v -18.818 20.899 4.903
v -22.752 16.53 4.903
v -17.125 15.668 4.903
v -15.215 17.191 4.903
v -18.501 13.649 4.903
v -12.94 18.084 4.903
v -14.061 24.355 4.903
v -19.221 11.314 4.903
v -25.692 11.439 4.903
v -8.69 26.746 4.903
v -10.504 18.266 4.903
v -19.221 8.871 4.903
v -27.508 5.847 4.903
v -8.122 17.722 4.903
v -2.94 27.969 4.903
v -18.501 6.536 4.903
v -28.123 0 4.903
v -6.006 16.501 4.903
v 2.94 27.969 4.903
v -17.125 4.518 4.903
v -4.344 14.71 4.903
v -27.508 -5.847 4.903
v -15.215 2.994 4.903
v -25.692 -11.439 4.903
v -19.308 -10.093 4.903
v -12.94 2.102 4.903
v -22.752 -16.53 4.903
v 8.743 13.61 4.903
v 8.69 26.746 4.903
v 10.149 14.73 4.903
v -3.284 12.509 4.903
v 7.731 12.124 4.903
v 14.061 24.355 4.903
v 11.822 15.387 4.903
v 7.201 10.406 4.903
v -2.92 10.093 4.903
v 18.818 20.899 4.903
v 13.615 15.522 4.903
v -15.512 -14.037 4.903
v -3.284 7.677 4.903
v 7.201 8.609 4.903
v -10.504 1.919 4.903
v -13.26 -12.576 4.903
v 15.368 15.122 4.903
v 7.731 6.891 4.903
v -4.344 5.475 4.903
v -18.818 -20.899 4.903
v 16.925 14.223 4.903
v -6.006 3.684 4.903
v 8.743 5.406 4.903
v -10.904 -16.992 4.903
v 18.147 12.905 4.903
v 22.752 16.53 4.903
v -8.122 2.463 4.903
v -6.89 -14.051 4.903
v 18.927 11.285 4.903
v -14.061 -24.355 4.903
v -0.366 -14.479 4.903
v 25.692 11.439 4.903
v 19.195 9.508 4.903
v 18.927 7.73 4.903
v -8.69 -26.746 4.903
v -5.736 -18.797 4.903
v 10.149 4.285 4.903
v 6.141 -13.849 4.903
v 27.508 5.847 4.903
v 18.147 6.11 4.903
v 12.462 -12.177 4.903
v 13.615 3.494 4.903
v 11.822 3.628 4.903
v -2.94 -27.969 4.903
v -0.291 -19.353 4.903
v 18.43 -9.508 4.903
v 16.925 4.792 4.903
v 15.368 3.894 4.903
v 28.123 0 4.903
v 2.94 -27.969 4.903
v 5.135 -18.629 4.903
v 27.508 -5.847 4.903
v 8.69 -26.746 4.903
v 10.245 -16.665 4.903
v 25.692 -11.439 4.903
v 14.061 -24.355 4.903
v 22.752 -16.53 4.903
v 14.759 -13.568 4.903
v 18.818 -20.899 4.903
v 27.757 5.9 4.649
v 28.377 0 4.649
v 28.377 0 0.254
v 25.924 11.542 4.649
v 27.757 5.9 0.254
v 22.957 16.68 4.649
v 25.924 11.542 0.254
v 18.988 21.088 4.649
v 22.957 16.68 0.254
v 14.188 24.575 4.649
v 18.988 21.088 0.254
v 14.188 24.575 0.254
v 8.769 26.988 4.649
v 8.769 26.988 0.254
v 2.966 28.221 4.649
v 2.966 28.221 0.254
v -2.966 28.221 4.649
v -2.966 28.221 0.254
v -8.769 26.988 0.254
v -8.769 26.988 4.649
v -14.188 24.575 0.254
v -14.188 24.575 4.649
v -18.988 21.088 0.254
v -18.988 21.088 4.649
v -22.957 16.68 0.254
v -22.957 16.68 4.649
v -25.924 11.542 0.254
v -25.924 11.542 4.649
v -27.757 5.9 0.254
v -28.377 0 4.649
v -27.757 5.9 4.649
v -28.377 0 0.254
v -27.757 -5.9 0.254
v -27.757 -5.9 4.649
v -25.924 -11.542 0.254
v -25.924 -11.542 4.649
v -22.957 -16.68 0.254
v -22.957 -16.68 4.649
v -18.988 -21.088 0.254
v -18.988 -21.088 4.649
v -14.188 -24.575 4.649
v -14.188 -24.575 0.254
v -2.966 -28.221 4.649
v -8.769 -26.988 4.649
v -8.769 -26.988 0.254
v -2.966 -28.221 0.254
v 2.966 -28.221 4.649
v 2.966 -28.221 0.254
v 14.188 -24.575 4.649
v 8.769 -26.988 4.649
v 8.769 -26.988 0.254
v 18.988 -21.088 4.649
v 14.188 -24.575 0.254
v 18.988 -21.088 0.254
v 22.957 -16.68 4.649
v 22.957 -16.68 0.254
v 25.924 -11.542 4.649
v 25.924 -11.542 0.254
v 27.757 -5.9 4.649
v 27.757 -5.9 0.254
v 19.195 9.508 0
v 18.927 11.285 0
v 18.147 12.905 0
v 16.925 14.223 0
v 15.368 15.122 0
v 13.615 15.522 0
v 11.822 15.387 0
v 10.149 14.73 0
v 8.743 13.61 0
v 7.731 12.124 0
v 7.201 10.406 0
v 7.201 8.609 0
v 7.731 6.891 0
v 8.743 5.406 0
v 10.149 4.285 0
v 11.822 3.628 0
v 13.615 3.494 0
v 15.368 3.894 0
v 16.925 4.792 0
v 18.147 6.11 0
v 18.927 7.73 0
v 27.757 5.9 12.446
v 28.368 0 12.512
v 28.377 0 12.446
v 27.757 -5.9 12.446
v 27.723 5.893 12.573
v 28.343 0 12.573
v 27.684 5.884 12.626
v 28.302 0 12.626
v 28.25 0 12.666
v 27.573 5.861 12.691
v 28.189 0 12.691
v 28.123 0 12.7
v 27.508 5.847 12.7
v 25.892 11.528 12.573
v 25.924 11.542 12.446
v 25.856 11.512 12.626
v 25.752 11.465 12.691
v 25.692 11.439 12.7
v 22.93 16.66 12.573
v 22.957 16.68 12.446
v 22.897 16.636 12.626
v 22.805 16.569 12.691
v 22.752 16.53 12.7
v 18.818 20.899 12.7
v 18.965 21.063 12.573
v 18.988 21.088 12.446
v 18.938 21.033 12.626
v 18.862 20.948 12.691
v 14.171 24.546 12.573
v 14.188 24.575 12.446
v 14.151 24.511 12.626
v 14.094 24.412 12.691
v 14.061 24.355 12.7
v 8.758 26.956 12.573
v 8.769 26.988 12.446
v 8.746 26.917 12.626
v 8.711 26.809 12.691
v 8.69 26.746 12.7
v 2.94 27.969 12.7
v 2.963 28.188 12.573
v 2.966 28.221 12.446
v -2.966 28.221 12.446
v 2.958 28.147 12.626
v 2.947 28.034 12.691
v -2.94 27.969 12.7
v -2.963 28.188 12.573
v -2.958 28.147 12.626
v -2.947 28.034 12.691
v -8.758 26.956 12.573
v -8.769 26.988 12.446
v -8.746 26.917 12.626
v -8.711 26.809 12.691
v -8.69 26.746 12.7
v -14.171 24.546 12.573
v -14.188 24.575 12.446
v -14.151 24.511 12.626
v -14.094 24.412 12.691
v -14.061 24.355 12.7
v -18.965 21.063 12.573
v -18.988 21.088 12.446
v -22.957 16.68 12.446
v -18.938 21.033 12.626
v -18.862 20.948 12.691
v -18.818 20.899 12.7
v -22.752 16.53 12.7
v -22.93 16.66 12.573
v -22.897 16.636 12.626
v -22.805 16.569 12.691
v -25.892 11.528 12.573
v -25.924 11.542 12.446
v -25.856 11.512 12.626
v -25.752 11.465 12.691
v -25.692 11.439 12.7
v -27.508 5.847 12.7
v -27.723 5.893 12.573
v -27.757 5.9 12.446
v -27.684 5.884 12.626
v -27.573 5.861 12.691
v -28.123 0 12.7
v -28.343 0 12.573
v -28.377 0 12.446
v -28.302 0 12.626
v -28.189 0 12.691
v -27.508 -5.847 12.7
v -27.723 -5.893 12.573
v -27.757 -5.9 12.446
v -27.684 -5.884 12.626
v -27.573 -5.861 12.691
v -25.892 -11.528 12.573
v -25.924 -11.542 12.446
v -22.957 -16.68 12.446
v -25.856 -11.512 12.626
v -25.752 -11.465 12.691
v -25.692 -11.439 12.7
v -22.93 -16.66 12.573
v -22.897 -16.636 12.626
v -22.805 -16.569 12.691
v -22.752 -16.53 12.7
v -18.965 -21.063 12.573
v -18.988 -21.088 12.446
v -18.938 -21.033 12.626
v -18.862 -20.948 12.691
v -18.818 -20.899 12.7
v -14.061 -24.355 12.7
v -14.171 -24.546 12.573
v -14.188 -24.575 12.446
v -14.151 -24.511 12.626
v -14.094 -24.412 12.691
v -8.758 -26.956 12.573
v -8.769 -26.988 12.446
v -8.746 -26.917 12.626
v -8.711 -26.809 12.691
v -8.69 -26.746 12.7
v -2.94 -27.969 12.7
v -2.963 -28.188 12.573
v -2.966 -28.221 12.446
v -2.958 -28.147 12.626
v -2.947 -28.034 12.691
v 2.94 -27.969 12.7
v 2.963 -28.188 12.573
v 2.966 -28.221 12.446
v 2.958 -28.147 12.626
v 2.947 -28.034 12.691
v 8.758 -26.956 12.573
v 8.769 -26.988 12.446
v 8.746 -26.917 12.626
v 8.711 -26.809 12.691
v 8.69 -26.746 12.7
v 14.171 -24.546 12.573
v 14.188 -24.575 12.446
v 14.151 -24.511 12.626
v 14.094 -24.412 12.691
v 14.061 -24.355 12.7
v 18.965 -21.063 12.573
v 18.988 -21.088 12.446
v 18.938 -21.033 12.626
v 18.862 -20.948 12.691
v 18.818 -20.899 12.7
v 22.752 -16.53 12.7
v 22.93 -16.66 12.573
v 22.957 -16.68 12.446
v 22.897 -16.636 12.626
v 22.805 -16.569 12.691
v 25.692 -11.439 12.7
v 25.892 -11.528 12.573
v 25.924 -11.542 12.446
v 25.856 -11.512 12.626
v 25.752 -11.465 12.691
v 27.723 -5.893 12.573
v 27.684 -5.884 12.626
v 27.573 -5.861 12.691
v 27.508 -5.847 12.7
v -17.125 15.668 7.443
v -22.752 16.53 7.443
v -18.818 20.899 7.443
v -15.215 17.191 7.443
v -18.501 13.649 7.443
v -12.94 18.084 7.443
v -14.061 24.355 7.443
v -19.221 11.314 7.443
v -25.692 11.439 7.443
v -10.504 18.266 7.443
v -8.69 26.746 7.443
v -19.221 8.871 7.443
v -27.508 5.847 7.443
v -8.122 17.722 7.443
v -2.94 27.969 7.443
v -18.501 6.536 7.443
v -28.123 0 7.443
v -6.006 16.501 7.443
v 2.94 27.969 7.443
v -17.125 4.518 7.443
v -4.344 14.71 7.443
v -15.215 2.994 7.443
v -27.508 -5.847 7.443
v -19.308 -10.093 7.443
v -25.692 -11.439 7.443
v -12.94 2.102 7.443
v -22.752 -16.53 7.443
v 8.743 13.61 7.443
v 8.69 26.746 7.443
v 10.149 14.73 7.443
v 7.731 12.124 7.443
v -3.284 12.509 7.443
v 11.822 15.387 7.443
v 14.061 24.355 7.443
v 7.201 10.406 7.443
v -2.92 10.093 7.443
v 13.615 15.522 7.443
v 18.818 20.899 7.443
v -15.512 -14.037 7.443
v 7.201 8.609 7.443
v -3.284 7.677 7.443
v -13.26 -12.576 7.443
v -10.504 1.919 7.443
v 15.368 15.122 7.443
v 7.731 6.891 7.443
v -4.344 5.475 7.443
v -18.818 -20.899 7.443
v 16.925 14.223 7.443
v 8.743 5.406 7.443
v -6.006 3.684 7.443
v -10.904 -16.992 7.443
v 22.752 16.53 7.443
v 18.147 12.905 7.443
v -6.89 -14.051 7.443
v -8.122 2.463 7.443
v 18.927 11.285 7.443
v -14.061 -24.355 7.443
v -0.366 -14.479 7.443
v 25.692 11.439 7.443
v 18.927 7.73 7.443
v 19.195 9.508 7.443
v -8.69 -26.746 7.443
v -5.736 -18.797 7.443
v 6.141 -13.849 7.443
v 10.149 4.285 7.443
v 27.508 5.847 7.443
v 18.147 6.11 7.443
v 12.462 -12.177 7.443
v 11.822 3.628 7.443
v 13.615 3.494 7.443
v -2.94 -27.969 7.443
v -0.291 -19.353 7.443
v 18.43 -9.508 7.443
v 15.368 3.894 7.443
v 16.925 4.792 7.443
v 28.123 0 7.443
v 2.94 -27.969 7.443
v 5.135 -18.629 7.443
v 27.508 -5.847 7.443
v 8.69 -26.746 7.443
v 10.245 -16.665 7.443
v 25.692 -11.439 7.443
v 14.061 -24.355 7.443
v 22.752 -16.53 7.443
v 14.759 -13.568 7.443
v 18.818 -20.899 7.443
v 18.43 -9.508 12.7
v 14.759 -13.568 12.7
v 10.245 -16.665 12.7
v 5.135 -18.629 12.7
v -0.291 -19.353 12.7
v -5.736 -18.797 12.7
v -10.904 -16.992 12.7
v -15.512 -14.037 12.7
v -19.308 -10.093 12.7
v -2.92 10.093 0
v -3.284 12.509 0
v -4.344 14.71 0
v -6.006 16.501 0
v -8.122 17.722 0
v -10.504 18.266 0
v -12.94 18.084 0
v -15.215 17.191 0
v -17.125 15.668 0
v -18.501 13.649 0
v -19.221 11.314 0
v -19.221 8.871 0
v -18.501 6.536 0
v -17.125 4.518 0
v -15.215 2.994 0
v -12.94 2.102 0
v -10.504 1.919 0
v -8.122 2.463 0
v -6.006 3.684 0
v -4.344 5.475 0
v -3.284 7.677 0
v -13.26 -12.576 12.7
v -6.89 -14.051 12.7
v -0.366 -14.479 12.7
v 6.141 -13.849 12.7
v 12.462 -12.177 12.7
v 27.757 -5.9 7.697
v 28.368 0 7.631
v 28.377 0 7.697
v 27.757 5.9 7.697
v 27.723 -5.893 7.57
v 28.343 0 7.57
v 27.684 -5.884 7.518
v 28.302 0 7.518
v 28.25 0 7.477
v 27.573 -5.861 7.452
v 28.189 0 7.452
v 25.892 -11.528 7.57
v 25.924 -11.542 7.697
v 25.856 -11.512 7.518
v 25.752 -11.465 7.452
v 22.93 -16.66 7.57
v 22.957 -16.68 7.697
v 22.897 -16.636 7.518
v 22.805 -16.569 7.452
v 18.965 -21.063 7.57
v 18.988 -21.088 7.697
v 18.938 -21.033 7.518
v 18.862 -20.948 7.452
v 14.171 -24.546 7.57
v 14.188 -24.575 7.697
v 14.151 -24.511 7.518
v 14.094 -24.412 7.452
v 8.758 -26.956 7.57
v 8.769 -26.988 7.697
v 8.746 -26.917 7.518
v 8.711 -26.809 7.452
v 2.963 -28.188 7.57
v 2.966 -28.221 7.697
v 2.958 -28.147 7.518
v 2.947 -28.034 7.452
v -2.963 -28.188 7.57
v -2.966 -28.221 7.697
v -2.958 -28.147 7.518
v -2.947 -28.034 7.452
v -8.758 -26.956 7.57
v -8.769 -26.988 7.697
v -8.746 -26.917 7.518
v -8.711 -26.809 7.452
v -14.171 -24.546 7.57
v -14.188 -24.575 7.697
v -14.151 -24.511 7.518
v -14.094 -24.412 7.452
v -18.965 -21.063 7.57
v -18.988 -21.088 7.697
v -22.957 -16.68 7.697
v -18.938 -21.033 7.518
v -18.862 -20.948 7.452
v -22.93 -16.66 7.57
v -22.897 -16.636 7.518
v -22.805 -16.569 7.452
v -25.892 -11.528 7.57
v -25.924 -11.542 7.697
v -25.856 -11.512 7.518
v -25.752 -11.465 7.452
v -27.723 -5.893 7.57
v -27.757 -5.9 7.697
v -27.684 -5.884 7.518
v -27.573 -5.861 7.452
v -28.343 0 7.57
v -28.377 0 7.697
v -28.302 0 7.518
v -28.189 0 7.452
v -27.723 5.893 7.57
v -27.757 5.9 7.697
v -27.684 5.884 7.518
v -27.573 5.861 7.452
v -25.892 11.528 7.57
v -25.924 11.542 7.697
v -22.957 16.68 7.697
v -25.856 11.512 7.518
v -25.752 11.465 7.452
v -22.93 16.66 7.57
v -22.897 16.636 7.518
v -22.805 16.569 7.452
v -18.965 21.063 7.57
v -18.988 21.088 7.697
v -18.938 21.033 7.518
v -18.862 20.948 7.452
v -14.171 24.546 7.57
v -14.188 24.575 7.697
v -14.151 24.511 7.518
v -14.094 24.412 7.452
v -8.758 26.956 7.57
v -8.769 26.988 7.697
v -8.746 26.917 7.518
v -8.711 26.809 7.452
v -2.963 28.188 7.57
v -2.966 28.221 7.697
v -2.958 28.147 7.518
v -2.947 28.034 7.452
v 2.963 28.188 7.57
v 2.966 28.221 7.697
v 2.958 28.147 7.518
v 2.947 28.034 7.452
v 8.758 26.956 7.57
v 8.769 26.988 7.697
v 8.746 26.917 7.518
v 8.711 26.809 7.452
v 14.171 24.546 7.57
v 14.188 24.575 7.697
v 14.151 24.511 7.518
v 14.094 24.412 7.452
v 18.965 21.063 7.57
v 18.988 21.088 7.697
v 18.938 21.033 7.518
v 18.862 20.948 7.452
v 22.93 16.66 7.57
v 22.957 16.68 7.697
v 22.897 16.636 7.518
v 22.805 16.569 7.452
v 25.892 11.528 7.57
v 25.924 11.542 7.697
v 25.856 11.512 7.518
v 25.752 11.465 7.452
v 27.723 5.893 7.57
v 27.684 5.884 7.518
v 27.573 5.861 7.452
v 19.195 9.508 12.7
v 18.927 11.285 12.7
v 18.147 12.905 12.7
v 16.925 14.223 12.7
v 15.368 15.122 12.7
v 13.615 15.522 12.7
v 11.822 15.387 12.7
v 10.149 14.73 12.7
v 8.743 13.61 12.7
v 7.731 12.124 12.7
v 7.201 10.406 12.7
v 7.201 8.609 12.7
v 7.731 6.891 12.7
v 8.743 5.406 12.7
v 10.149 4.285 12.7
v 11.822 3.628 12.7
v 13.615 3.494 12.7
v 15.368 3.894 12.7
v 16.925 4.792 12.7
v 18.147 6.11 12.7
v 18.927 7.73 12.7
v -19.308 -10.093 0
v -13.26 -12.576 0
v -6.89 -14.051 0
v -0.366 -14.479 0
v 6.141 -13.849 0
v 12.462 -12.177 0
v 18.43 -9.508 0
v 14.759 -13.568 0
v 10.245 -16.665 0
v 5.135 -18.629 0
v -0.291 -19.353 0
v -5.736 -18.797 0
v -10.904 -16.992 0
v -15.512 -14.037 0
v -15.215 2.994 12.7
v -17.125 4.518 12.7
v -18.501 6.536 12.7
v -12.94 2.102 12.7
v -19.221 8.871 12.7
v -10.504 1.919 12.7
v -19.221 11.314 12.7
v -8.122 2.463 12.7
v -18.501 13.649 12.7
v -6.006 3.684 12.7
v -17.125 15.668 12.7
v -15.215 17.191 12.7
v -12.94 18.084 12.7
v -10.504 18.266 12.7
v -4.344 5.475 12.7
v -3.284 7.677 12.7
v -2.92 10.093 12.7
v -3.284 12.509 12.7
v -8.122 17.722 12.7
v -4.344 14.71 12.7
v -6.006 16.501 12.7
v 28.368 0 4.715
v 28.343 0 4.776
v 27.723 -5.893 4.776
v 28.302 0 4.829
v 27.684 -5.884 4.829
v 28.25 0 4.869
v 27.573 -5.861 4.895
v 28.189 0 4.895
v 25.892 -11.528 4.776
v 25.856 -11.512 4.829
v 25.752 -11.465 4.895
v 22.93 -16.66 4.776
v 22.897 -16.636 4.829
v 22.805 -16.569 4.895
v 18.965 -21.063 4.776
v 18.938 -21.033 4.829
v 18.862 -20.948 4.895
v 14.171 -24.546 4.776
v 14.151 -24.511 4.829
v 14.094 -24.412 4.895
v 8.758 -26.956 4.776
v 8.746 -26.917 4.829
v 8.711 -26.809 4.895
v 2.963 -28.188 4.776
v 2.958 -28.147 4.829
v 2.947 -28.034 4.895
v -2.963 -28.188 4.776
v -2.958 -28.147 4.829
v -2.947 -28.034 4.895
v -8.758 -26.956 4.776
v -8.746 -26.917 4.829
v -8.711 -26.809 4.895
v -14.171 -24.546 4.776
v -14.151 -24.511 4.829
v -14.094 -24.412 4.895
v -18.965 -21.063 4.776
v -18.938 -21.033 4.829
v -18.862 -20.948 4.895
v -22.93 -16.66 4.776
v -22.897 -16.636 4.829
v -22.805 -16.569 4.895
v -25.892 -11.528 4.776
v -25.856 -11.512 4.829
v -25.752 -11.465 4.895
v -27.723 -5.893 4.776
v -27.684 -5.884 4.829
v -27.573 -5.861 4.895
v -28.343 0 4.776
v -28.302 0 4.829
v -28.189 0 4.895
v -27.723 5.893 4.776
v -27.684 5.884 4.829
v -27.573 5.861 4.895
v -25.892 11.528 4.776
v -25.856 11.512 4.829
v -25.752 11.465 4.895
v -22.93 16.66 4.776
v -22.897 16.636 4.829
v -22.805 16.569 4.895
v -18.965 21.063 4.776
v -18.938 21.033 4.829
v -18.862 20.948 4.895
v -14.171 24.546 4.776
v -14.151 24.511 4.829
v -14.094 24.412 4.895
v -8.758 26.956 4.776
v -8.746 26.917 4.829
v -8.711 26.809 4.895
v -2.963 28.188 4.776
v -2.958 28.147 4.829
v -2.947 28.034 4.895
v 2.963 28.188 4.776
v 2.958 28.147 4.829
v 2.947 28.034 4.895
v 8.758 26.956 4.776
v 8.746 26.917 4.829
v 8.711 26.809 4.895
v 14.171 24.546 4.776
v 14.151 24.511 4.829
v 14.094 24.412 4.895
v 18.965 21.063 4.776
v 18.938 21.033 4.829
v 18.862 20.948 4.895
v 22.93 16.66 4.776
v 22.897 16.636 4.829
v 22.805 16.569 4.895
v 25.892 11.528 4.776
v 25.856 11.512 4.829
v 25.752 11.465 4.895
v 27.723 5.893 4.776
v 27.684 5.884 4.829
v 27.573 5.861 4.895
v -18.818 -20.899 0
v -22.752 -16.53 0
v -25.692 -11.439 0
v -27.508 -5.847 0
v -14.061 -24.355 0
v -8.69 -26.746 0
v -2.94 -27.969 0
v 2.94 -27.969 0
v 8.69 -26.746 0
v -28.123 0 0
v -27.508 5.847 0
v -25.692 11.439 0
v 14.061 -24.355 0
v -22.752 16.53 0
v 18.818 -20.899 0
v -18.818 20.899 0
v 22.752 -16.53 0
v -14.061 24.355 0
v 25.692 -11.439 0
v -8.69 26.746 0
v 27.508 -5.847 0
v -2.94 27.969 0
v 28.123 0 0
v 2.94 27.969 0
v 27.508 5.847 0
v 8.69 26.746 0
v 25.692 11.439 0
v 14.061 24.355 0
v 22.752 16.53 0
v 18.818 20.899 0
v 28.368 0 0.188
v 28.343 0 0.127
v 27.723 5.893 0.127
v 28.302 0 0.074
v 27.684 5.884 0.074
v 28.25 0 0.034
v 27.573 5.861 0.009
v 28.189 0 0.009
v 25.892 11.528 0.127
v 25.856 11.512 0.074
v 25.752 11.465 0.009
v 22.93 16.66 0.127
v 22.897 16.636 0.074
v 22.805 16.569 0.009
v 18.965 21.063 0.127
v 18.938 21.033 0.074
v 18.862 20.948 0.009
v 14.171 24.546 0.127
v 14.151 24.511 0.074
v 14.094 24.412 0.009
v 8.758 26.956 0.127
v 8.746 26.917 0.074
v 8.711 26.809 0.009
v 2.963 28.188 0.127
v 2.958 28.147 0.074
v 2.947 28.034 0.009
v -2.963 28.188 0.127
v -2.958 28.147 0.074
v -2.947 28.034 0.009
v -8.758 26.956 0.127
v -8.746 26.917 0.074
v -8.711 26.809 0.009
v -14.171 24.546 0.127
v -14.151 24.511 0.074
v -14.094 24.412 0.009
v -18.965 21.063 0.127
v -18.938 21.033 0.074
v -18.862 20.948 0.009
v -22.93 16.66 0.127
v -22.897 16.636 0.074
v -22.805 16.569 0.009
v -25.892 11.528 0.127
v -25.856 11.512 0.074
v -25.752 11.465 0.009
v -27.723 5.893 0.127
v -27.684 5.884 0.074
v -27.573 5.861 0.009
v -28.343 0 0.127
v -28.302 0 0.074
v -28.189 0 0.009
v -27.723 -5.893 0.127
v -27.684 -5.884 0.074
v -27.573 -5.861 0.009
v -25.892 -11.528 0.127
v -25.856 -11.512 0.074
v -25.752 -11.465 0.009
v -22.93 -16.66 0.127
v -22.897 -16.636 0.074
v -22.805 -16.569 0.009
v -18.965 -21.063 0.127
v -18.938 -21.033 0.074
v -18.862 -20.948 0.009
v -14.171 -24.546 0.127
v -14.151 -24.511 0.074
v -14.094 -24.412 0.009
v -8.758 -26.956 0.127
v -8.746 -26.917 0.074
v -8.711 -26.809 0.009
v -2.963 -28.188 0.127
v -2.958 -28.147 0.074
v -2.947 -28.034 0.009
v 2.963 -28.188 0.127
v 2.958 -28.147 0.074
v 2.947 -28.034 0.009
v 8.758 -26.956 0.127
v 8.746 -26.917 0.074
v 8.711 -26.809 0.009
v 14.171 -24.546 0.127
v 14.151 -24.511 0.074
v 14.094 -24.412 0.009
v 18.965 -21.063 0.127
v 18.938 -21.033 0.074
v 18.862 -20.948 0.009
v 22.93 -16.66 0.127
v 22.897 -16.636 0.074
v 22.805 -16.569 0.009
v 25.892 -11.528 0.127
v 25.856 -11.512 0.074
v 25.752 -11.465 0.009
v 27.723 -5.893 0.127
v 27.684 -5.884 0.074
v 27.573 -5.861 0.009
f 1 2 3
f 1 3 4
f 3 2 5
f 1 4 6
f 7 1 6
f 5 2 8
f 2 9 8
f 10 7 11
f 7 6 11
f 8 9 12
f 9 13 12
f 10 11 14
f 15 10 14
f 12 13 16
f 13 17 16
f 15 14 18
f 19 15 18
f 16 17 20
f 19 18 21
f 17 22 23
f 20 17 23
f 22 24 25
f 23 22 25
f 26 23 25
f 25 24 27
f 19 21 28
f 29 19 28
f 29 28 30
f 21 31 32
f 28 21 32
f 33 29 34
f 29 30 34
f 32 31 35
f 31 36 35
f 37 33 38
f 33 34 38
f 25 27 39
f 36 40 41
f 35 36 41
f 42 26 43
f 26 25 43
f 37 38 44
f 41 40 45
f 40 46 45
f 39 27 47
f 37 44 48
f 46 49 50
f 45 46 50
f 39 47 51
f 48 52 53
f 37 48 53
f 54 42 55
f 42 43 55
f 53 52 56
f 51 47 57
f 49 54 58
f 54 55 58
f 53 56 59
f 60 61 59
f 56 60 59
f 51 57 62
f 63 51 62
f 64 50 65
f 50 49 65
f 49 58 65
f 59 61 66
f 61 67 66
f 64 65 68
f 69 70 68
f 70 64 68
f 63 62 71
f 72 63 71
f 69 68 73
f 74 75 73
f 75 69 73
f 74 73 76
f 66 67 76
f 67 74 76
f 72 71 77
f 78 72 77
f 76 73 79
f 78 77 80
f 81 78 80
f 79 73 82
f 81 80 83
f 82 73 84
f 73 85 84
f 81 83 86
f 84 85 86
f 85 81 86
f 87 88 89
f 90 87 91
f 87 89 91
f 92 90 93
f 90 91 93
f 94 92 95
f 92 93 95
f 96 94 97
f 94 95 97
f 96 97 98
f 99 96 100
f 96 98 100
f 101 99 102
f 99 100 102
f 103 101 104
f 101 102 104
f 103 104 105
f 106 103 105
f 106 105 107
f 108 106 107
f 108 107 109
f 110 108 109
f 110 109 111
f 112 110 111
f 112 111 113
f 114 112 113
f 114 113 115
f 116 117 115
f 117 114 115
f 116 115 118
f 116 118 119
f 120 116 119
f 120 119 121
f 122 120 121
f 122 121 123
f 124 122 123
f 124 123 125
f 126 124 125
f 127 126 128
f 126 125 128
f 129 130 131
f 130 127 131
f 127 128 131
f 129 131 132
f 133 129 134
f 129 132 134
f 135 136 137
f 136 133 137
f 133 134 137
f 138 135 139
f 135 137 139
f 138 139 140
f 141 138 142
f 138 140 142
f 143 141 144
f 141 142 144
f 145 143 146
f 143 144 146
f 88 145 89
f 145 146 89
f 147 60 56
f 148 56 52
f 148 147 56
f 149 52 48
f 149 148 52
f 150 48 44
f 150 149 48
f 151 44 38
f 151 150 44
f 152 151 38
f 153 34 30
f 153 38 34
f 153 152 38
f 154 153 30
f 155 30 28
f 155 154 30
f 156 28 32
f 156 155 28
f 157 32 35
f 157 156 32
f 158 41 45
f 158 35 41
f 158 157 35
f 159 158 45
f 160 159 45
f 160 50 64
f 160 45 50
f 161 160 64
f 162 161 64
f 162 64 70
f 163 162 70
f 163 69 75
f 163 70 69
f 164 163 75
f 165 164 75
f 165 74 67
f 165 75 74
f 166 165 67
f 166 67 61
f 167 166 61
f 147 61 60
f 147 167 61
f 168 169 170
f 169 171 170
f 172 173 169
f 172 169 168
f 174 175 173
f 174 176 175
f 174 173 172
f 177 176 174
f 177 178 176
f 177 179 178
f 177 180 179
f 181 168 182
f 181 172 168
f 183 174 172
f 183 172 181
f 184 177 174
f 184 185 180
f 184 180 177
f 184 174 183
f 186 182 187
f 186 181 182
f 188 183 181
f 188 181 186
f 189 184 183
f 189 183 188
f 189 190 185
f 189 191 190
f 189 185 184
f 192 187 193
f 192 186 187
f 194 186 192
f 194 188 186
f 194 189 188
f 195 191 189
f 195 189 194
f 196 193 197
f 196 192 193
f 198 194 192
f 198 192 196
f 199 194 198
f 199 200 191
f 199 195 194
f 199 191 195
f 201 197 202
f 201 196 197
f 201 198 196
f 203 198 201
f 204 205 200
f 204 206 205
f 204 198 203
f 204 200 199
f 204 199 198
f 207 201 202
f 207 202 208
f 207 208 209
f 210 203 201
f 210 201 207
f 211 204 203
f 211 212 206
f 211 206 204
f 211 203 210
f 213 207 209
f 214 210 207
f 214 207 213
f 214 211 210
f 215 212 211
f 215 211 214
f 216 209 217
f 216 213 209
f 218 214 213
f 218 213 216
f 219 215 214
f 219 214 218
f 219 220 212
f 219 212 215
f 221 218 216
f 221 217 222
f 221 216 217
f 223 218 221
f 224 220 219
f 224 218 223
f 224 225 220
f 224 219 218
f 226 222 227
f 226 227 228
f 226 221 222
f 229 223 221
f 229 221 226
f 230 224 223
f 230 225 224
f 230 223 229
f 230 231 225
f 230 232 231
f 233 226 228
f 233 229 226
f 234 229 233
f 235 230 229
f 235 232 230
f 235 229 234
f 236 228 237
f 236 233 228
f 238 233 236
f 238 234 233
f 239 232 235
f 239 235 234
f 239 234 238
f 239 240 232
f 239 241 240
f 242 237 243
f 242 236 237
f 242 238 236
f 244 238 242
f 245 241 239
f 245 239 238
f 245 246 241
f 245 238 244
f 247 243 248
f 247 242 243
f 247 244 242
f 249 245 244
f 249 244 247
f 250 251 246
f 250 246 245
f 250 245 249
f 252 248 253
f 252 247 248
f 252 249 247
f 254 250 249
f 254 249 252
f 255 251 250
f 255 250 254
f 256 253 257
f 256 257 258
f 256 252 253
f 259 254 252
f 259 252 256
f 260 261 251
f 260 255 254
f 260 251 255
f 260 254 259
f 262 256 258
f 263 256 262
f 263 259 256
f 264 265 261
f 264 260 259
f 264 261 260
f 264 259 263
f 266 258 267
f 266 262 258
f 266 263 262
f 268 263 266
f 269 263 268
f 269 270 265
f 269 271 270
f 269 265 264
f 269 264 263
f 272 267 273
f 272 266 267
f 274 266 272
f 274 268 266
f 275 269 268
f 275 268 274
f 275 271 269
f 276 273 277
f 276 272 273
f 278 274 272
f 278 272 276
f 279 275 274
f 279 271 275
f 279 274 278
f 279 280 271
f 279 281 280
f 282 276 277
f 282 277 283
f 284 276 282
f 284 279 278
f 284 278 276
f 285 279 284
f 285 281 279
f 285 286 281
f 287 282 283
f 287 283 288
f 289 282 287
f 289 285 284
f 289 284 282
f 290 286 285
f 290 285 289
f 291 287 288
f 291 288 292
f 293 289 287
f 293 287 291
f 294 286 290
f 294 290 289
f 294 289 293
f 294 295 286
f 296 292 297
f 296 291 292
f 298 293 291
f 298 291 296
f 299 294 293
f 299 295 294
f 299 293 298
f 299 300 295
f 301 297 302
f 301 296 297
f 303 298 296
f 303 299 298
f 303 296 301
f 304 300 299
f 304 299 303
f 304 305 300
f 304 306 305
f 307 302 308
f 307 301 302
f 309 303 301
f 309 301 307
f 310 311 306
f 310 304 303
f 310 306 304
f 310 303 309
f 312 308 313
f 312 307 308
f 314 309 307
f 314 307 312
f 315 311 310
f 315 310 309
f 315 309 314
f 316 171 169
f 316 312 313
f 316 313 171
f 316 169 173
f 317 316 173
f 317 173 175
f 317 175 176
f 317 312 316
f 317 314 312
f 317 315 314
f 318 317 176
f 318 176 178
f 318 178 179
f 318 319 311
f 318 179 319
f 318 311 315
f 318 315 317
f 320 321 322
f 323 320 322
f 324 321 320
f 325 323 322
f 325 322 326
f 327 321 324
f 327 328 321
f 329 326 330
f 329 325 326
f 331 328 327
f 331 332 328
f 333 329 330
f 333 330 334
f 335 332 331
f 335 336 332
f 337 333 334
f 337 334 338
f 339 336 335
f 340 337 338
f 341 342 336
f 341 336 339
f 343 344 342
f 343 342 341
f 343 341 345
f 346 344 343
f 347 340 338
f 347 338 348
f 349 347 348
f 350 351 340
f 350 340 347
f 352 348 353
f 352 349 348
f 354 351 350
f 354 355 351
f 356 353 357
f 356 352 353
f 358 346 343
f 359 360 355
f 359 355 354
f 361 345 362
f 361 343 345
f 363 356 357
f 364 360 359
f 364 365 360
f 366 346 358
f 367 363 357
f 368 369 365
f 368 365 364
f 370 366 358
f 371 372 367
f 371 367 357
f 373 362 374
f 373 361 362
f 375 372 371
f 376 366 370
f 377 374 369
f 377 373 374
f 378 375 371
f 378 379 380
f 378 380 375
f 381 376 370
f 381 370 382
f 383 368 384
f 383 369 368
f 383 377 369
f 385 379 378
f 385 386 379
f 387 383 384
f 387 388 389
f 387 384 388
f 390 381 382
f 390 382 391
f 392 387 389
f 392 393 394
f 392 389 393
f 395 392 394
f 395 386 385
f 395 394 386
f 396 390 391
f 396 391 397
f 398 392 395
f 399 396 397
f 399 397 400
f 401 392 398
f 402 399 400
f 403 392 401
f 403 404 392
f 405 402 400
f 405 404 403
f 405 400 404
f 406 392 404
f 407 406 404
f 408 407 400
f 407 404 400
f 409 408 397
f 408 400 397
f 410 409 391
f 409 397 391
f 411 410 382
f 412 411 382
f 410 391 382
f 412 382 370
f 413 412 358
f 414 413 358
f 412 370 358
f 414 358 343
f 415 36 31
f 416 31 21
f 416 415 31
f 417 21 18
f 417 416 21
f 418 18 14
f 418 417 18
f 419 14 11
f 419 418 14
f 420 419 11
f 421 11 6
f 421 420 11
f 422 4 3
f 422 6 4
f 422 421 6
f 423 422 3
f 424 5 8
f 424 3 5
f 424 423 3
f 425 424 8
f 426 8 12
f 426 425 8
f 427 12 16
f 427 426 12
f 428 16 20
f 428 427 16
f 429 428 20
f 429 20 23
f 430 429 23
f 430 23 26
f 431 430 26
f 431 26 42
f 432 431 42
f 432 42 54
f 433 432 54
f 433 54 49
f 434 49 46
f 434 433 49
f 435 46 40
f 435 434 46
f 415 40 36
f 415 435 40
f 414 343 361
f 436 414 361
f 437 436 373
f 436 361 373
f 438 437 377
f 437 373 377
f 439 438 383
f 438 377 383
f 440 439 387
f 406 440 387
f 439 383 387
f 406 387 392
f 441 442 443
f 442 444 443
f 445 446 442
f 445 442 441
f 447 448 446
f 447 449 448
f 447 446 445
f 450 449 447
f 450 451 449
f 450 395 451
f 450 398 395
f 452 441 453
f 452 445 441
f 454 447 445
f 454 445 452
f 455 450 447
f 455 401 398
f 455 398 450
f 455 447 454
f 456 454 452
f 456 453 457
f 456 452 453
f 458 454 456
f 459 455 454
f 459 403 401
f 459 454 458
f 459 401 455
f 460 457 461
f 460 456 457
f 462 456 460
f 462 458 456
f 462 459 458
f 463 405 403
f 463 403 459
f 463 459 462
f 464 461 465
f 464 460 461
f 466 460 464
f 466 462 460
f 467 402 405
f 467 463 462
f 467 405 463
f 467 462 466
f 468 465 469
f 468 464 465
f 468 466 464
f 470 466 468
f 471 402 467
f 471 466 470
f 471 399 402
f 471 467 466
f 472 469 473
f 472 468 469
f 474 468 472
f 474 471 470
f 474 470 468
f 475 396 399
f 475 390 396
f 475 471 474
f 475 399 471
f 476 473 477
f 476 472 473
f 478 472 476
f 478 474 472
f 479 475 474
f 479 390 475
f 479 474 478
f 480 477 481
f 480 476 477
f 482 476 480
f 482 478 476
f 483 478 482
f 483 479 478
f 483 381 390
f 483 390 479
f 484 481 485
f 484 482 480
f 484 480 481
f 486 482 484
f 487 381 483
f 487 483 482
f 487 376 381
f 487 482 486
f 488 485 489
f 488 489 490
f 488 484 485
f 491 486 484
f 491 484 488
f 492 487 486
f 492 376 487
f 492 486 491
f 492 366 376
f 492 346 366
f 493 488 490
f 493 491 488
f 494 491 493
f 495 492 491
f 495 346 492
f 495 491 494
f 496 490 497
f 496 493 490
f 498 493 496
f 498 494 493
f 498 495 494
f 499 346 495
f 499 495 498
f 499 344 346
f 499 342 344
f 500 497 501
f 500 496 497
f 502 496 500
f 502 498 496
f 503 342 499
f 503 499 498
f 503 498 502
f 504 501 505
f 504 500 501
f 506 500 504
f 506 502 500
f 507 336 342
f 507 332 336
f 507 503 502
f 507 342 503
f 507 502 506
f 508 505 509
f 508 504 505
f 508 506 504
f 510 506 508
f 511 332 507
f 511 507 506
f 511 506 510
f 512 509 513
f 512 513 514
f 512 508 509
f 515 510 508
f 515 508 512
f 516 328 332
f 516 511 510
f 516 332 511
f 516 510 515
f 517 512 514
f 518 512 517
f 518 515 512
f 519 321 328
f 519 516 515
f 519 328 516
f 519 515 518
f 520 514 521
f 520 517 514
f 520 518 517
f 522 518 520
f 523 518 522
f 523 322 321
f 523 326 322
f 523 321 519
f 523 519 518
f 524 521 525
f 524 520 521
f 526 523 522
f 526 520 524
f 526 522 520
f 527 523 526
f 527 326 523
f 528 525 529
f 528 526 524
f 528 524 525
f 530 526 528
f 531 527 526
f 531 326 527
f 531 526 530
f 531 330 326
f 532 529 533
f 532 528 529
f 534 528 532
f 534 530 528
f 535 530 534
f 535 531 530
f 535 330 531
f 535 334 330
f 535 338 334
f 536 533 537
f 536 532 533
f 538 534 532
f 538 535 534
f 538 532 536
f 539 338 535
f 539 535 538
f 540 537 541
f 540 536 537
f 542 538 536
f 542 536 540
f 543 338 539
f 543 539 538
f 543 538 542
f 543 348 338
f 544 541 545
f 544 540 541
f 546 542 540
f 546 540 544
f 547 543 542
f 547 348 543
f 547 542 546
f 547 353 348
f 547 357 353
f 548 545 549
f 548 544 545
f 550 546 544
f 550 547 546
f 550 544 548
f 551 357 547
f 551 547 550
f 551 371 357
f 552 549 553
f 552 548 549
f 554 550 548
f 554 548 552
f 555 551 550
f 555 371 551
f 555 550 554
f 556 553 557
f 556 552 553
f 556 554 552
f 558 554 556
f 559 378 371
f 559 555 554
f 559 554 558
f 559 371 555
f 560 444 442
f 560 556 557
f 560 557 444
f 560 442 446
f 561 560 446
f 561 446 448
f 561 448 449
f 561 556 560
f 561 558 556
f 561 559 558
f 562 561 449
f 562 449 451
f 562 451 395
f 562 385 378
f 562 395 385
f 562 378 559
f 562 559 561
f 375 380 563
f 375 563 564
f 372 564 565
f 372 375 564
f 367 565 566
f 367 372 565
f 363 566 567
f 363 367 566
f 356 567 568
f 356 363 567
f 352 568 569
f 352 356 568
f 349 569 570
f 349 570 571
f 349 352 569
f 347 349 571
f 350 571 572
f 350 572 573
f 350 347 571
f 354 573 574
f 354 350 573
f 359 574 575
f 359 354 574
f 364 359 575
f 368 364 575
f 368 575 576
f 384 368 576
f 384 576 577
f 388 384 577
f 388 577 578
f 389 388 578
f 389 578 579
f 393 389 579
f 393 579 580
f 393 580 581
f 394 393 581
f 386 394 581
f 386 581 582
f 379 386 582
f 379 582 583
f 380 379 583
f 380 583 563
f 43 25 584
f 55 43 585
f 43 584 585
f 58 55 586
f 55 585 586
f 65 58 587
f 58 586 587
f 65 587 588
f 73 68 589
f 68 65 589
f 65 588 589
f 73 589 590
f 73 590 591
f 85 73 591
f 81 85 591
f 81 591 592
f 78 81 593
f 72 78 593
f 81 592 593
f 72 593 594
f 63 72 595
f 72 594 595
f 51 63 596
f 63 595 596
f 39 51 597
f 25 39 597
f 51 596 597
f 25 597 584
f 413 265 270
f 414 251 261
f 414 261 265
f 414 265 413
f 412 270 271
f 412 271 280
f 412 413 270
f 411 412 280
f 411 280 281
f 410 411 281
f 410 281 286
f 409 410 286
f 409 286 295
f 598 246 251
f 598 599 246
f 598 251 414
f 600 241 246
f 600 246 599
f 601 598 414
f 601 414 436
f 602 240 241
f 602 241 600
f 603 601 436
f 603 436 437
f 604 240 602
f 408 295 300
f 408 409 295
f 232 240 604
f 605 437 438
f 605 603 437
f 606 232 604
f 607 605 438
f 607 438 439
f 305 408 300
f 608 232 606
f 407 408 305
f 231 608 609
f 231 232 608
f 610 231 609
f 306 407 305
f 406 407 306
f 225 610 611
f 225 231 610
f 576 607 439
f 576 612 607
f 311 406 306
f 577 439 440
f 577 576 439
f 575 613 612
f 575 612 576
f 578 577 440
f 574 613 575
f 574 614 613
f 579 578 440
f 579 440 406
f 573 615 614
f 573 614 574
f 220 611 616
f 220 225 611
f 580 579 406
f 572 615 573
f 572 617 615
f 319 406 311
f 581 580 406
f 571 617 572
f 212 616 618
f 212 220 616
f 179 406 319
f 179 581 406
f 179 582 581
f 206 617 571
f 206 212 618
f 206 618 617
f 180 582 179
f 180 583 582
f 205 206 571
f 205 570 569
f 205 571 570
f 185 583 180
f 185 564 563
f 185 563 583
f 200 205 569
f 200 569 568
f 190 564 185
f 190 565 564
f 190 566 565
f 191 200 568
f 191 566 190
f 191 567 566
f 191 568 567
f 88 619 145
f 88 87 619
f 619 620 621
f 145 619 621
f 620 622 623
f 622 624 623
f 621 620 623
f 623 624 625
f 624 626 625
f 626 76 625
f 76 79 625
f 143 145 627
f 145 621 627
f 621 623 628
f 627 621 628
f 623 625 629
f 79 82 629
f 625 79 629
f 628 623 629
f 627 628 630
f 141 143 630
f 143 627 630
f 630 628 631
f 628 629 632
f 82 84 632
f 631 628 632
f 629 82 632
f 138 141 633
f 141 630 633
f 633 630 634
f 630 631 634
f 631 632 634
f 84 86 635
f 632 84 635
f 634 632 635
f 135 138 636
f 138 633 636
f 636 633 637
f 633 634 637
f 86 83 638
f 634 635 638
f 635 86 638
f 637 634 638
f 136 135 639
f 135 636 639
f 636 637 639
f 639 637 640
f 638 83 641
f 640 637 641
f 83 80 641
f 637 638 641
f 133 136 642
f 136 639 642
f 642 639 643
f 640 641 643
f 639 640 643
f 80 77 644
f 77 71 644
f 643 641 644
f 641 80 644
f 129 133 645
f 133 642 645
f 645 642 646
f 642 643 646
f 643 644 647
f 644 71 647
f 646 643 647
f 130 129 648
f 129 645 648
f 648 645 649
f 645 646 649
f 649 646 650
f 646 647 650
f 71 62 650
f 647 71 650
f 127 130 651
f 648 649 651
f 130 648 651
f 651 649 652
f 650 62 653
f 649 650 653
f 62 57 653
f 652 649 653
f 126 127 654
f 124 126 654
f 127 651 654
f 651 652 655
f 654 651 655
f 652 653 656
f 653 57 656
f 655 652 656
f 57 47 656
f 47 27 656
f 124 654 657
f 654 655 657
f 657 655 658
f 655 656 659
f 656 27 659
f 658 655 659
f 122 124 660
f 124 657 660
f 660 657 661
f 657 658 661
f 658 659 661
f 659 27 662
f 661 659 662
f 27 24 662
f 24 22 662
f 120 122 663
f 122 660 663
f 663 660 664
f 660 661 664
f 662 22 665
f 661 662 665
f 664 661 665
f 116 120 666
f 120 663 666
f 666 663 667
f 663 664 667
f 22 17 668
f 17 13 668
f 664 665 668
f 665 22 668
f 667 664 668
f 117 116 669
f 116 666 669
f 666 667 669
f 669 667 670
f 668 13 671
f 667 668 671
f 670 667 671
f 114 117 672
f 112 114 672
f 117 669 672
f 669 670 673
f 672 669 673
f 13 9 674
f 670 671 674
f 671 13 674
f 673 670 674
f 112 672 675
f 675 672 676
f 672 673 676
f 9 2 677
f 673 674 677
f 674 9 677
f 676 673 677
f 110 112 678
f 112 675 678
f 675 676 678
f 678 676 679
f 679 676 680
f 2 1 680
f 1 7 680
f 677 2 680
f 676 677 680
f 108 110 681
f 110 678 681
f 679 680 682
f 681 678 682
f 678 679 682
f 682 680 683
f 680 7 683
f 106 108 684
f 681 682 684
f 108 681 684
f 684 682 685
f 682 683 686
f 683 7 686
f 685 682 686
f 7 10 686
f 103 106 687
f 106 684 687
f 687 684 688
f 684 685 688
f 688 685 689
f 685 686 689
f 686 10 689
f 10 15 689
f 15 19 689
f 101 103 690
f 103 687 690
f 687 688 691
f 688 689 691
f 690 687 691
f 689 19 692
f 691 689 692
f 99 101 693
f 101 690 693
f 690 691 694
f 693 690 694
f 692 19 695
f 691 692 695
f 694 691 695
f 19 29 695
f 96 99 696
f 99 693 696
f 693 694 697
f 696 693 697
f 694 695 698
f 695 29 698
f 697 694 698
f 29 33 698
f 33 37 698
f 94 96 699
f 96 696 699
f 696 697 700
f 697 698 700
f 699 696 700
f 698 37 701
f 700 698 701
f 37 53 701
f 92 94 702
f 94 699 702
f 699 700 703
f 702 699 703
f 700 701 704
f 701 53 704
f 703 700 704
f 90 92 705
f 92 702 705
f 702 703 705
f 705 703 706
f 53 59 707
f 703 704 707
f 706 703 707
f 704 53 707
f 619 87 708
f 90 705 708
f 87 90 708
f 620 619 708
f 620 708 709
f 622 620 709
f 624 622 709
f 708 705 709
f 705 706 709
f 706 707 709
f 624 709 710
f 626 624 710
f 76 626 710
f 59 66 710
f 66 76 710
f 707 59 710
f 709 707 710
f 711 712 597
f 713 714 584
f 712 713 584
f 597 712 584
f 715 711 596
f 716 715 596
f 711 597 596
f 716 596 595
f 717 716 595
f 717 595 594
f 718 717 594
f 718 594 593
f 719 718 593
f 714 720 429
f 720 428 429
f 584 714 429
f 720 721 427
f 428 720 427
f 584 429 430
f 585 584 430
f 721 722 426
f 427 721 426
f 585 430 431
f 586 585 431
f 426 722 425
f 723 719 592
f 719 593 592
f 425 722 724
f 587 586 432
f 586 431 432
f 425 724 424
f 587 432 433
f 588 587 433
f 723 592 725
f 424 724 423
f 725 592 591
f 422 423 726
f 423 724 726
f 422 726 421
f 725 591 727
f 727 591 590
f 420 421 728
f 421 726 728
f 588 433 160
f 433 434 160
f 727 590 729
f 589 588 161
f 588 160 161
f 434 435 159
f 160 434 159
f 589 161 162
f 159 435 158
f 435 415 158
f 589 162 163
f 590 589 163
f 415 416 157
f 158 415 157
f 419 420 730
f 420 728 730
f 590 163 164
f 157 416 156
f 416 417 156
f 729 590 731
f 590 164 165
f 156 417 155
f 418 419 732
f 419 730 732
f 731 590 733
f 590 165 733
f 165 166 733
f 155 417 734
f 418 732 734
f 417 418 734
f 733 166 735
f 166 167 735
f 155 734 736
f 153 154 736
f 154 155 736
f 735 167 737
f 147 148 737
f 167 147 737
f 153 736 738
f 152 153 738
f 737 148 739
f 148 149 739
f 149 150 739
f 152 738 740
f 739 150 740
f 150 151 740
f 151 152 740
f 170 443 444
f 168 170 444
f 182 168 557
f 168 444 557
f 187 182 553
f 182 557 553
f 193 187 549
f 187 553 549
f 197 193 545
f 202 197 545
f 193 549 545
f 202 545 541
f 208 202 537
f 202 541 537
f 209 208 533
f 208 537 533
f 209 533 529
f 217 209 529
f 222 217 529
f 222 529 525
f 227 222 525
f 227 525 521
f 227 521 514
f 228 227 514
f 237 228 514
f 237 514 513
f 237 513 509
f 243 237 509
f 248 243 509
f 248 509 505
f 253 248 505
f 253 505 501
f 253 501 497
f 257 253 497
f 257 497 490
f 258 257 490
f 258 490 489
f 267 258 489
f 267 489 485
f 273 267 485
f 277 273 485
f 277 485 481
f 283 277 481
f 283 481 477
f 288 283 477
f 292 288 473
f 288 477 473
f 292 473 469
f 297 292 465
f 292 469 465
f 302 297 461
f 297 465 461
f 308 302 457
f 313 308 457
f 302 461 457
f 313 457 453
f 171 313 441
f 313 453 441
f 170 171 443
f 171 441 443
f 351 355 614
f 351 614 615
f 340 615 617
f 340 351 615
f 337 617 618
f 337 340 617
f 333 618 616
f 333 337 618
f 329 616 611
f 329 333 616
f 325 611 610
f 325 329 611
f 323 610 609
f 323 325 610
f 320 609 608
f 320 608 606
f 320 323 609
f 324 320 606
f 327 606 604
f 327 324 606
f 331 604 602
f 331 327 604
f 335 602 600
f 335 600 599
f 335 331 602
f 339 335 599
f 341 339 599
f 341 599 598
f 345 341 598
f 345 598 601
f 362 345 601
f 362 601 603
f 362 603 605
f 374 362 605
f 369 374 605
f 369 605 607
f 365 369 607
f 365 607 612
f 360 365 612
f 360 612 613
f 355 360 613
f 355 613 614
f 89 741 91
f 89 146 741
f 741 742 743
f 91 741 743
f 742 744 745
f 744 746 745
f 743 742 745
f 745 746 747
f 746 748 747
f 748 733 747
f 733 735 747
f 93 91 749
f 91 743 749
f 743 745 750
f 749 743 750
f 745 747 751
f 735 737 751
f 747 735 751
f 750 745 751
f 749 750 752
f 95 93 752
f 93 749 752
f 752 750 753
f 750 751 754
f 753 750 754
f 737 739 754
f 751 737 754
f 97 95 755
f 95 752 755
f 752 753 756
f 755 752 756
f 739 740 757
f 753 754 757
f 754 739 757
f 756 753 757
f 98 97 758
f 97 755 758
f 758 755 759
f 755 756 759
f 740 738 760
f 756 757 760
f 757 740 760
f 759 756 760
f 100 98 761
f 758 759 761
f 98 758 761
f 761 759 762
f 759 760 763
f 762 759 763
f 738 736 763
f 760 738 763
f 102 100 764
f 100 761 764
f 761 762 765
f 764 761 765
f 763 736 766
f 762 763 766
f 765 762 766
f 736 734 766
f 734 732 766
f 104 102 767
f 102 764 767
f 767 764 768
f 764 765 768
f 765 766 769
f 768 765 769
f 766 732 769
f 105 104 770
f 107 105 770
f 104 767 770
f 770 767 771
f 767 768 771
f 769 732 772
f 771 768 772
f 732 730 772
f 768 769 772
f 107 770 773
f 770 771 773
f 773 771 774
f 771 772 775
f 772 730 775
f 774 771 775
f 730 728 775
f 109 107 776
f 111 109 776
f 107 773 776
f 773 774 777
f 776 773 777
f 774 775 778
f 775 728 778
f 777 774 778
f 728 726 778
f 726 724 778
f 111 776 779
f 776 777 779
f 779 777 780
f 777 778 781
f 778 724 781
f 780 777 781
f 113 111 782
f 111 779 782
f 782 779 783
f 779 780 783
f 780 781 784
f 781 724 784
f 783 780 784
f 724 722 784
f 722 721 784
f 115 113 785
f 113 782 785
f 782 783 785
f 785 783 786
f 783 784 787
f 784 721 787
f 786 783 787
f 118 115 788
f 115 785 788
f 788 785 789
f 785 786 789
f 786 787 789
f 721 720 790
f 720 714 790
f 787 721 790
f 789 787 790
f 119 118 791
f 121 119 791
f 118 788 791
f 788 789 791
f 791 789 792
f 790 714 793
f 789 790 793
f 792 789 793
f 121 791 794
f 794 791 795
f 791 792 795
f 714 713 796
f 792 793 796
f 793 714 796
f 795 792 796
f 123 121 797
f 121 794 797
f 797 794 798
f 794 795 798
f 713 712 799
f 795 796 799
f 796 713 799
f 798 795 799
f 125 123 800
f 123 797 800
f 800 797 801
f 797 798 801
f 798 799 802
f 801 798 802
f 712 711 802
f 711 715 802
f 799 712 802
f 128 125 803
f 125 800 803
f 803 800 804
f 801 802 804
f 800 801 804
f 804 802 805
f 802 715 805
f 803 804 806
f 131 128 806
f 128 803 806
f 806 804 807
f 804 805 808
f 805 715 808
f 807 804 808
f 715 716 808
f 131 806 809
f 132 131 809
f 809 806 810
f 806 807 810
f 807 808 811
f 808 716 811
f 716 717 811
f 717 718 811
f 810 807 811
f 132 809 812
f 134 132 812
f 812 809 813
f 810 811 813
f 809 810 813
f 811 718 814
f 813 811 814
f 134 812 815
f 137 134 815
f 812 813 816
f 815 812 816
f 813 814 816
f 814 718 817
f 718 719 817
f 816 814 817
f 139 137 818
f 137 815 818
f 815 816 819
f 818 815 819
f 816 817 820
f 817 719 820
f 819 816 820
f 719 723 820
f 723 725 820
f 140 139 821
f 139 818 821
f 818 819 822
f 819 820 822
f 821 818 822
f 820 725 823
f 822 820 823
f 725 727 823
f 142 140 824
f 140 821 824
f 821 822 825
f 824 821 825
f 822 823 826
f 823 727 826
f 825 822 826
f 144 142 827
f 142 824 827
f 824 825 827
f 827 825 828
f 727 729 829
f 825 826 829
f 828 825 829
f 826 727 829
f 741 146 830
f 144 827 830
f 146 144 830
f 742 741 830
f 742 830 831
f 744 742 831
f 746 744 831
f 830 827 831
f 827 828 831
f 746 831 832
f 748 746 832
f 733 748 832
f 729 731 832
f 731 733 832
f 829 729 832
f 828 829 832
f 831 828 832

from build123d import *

# Parameters (mm, degrees)
F0_R     = 28.3768649986
F0_R_2   = 8.1963755189
F0_R_3   = 6.0308885492
F1_DEPTH = 12.7
F2_W     = 110.4900132516
F2_H     = 2.54
F3_DEPTH = 39.96657
F4_R     = 0.254


with BuildPart() as f1:
    # F0 (on Top) → F1 (new body)
    with BuildSketch(Plane.XY):
        Circle(F0_R)
        with BuildLine():
            ThreePointArc((18.4300914407, -9.5075871795), (-0.2907087951, -19.3528018979), (-19.3077158183, -10.0926691666))
            ThreePointArc((-19.3077158183, -10.0926691666), (-0.3662766969, -14.478669765), (18.4300914407, -9.5075871795))
        make_face(mode=Mode.SUBTRACT)
        with Locations((-11.1165624112, 10.0926691666)):
            Circle(F0_R_2, mode=Mode.SUBTRACT)
        with Locations((13.1643526256, 9.5075871795)):
            Circle(F0_R_3, mode=Mode.SUBTRACT)
    extrude(amount=F1_DEPTH)

    # F2 (on Front) → F3 (cut, symmetric)
    with BuildSketch(Plane.XZ):
        with Locations((1.1265333742, 6.1731699388)):
            Rectangle(F2_W, F2_H)
    extrude(amount=F3_DEPTH, both=True, mode=Mode.SUBTRACT)

    # F4
    f4_edges = [f1.edges().sort_by_distance(p)[0] for p in [
        (-28.376865, 0, 12.7),
        (-28.376865, 0, 0),
        (-28.376865, 0, 7.44317),
        (-28.376865, 0, 4.90317),
    ]]
    fillet(f4_edges, radius=F4_R)


solid = f1.part
